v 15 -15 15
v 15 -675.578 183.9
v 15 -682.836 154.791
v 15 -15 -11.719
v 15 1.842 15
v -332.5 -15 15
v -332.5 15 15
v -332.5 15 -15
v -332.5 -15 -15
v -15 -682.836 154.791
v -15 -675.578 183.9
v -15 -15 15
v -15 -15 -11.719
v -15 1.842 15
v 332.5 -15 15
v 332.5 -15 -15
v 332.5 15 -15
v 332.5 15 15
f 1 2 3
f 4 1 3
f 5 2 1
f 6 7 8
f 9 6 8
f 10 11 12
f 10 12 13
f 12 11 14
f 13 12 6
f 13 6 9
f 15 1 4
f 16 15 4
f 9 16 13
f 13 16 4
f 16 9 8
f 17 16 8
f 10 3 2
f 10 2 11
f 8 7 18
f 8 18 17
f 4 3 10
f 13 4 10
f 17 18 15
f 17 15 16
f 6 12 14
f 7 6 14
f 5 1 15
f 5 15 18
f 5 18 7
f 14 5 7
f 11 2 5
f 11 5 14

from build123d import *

# Parameters (mm, degrees)
BOSS_EXTRUDE1_DEPTH      = 332.5
BOSS_EXTRUDE1_DEPTH_BACK = 332.5
SKETCH1_W                = 30
SKETCH1_H                = 30
SKETCH2_W                = 30
SKETCH2_H                = 30
BOSS_EXTRUDE2_DEPTH      = 700


with BuildPart() as part:
    # Sketch1 → Boss-Extrude1 (new, two sides: drawn at the far end of the back side and taken through both)
    with BuildSketch(Plane(origin=(0, 0, 0), x_dir=(0, 0, -1), z_dir=(1, 0, 0)).offset(-BOSS_EXTRUDE1_DEPTH_BACK)):
        Rectangle(SKETCH1_W, SKETCH1_H)
    extrude(amount=BOSS_EXTRUDE1_DEPTH + BOSS_EXTRUDE1_DEPTH_BACK)

    # Sketch2 → Boss-Extrude2 (add)
    with BuildSketch(Plane(origin=(0, 0, 0), x_dir=(-1, 0, 0), z_dir=(0, -0.9702957262759964, 0.24192189559966812))):
        Rectangle(SKETCH2_W, SKETCH2_H)
    extrude(amount=BOSS_EXTRUDE2_DEPTH)


solid = part.part
